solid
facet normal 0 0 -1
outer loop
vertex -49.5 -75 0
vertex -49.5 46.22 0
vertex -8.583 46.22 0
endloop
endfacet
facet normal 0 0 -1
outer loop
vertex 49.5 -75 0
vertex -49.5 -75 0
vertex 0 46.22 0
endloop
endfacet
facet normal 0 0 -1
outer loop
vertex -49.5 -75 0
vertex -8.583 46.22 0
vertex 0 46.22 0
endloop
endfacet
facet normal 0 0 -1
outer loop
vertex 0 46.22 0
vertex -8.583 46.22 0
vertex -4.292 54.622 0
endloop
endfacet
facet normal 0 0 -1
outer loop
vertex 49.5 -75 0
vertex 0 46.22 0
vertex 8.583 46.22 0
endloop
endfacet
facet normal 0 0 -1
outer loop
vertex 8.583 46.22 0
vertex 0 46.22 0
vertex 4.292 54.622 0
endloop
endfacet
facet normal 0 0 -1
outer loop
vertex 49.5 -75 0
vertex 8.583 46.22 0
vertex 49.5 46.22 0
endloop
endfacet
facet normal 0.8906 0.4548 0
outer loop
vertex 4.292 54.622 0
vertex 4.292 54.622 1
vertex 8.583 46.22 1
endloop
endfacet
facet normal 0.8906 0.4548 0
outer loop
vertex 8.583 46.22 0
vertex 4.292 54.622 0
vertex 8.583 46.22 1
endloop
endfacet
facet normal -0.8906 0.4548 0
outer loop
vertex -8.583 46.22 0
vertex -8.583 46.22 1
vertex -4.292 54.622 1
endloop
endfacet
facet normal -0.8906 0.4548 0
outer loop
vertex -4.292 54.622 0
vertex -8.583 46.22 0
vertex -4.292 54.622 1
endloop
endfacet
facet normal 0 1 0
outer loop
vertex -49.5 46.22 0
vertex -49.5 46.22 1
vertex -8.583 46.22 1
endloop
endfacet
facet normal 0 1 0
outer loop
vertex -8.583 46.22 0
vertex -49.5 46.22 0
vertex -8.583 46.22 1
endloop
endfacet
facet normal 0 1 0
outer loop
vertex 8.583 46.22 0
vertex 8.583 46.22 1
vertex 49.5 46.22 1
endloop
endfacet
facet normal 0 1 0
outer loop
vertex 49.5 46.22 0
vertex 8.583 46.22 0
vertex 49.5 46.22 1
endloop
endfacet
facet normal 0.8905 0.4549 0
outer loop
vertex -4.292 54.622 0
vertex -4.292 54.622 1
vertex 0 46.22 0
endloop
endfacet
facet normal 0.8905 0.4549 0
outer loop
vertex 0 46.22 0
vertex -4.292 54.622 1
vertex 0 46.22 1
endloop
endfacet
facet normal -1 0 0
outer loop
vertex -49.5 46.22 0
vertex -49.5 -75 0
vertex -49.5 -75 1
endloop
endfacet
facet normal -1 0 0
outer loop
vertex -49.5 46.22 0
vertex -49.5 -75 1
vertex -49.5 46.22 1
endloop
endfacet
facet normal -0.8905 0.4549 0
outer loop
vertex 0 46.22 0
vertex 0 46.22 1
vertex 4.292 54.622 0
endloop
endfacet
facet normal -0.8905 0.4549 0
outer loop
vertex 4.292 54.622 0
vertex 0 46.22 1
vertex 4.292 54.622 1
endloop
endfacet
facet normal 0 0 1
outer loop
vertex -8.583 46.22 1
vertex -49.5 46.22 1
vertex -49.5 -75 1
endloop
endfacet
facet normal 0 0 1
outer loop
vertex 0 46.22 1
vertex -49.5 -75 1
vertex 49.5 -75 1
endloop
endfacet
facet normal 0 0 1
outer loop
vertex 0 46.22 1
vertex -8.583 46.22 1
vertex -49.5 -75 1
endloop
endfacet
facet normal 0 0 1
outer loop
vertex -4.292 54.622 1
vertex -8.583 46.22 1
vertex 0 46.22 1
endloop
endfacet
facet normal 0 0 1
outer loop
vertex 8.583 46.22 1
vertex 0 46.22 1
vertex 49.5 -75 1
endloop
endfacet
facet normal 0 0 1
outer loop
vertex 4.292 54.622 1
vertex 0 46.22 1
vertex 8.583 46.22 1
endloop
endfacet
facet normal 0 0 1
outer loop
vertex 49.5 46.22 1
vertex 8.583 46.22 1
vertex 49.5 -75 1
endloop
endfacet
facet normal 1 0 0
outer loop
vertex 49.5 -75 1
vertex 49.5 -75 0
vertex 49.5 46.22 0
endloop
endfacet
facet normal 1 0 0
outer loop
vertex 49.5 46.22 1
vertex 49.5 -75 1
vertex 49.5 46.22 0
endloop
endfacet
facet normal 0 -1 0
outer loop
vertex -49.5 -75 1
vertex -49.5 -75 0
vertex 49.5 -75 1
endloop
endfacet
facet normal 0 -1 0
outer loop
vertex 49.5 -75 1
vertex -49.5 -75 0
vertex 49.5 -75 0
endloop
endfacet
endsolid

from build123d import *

# Parameters (mm, degrees)
F0_W     = 99
F0_H     = 150
F1_DEPTH = 1
F4_DEPTH = 25


with BuildPart() as f1:
    # F0 (on Top) → F1 (new body)
    with BuildSketch(Plane.XY):
        Rectangle(F0_W, F0_H)
    extrude(amount=F1_DEPTH)

    # F3 (on face) → F4 (cut)
    with BuildSketch(Plane.XY.offset(1)):
        Polygon((-62.001765, 46.220153), (-46.321515, 46.220153), (-8.583423, 46.220153), (-4.291712, 54.622024), (0, 46.220153), (4.291712, 54.622024), (8.583423, 46.220153), (46.321515, 46.220153), (54.136954, 46.220153), (59.024267, 77.810913), (-51.67358, 77.810913), align=None)
    extrude(amount=-F4_DEPTH, mode=Mode.SUBTRACT)


solid = f1.part
